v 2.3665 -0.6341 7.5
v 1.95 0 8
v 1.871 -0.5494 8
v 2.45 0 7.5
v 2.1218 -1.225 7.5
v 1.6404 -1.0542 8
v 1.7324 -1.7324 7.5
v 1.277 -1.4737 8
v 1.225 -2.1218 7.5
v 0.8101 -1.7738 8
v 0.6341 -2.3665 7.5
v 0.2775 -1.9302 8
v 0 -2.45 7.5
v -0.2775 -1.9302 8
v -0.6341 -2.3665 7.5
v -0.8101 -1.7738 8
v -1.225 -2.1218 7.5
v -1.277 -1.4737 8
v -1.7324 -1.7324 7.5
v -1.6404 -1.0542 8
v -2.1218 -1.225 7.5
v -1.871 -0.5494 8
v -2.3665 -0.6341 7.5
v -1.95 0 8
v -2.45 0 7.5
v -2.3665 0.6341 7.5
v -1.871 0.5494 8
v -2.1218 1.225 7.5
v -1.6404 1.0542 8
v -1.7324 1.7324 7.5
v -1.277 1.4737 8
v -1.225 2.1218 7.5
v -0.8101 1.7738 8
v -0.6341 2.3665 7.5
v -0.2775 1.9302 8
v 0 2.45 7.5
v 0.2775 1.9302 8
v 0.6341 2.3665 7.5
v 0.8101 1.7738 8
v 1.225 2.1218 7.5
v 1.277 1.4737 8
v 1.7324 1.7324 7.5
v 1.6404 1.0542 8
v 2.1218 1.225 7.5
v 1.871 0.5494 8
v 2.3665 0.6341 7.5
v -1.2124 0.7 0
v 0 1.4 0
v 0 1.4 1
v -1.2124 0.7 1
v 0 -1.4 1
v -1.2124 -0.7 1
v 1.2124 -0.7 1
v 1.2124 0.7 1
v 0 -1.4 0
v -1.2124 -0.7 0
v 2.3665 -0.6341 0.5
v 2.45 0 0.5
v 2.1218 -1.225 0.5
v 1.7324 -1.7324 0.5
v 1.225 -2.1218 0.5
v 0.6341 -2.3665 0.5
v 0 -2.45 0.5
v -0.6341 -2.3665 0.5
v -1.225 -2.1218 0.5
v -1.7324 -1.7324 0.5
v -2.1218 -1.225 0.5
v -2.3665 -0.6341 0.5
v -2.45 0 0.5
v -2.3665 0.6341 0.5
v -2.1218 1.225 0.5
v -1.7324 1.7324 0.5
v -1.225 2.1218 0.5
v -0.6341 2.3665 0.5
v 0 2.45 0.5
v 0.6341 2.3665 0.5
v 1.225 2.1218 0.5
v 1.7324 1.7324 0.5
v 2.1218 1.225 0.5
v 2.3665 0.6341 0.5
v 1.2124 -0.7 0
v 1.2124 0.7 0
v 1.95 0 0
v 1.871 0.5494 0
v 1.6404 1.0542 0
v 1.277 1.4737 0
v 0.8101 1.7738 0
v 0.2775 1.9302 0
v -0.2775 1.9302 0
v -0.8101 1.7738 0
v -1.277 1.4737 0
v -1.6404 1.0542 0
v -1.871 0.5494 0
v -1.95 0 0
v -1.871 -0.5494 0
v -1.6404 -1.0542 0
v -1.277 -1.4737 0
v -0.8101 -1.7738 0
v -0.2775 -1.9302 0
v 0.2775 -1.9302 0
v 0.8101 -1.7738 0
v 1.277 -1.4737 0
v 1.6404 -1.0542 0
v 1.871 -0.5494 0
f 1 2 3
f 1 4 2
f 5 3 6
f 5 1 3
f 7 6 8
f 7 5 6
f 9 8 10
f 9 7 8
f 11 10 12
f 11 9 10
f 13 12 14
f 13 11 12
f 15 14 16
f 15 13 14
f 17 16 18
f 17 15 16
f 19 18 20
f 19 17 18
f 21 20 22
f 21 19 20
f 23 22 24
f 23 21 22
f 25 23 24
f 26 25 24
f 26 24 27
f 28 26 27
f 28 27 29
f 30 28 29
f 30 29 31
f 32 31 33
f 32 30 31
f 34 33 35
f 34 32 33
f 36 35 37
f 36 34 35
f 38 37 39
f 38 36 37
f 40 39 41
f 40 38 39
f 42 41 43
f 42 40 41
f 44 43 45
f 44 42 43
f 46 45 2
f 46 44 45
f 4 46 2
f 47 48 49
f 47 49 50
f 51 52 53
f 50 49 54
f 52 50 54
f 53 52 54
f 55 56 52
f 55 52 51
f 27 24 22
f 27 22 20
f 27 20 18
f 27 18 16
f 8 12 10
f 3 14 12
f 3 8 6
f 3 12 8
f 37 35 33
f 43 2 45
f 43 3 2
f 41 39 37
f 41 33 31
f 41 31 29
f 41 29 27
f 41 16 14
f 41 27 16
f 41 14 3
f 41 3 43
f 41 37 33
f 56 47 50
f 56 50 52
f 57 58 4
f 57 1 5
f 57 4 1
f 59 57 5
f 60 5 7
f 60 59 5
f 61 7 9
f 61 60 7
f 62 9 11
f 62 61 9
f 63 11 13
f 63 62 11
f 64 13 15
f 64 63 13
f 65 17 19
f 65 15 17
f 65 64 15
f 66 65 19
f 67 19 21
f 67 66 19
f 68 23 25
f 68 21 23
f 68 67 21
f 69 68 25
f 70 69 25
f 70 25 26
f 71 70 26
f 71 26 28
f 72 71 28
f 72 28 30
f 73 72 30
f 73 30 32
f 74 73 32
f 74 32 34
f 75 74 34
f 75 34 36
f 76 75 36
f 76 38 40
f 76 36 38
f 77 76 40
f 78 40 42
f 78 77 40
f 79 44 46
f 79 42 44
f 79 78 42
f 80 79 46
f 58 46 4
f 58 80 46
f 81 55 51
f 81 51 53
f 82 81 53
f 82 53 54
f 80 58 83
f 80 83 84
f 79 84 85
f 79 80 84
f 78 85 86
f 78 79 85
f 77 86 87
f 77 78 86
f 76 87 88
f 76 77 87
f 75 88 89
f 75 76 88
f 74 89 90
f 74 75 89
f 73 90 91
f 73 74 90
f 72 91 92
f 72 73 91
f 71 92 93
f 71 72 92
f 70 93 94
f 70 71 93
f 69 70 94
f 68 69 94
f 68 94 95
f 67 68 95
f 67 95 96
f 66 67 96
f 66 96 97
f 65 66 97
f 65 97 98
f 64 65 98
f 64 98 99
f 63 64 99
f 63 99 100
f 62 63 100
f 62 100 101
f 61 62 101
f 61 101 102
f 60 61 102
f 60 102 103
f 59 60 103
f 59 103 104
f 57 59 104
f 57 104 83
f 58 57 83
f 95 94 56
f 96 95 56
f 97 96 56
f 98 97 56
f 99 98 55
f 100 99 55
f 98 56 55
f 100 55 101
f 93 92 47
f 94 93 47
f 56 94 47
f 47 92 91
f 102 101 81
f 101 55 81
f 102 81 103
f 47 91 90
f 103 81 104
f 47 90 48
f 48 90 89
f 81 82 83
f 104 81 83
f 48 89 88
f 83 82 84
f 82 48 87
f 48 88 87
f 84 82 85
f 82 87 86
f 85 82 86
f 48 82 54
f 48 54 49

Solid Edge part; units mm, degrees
sketch "Sketch1" plane through (0, 0, 0) normal (0, 0, 1) x (1, 0, 0)
  circle A0 centre (0, 0) radius 2.45
extrude "Protrusion1" add sketch "Sketch1" along normal blind 8
chamfer "Chamfer_1" distance 0.5 angle 45 2 edges at (-2.45, 0, 8) (-2.45, 0, 0)
sketch "Sketch2" plane through (0, 0, 0) normal (0, 0, -1) x (0, 1, 0)
  line L0 (-1.4, 0) -> (-0.7, 1.2124)
  line L1 (-0.7, 1.2124) -> (0.7, 1.2124)
  line L2 (0.7, 1.2124) -> (1.4, 0)
  line L3 (1.4, 0) -> (0.7, -1.2124)
  line L4 (0.7, -1.2124) -> (-0.7, -1.2124)
  line L5 (-0.7, -1.2124) -> (-1.4, 0)
extrude "ExtrudedCutout_1" cut sketch "Sketch2" against normal blind 1
properties material "Stainless steel"
